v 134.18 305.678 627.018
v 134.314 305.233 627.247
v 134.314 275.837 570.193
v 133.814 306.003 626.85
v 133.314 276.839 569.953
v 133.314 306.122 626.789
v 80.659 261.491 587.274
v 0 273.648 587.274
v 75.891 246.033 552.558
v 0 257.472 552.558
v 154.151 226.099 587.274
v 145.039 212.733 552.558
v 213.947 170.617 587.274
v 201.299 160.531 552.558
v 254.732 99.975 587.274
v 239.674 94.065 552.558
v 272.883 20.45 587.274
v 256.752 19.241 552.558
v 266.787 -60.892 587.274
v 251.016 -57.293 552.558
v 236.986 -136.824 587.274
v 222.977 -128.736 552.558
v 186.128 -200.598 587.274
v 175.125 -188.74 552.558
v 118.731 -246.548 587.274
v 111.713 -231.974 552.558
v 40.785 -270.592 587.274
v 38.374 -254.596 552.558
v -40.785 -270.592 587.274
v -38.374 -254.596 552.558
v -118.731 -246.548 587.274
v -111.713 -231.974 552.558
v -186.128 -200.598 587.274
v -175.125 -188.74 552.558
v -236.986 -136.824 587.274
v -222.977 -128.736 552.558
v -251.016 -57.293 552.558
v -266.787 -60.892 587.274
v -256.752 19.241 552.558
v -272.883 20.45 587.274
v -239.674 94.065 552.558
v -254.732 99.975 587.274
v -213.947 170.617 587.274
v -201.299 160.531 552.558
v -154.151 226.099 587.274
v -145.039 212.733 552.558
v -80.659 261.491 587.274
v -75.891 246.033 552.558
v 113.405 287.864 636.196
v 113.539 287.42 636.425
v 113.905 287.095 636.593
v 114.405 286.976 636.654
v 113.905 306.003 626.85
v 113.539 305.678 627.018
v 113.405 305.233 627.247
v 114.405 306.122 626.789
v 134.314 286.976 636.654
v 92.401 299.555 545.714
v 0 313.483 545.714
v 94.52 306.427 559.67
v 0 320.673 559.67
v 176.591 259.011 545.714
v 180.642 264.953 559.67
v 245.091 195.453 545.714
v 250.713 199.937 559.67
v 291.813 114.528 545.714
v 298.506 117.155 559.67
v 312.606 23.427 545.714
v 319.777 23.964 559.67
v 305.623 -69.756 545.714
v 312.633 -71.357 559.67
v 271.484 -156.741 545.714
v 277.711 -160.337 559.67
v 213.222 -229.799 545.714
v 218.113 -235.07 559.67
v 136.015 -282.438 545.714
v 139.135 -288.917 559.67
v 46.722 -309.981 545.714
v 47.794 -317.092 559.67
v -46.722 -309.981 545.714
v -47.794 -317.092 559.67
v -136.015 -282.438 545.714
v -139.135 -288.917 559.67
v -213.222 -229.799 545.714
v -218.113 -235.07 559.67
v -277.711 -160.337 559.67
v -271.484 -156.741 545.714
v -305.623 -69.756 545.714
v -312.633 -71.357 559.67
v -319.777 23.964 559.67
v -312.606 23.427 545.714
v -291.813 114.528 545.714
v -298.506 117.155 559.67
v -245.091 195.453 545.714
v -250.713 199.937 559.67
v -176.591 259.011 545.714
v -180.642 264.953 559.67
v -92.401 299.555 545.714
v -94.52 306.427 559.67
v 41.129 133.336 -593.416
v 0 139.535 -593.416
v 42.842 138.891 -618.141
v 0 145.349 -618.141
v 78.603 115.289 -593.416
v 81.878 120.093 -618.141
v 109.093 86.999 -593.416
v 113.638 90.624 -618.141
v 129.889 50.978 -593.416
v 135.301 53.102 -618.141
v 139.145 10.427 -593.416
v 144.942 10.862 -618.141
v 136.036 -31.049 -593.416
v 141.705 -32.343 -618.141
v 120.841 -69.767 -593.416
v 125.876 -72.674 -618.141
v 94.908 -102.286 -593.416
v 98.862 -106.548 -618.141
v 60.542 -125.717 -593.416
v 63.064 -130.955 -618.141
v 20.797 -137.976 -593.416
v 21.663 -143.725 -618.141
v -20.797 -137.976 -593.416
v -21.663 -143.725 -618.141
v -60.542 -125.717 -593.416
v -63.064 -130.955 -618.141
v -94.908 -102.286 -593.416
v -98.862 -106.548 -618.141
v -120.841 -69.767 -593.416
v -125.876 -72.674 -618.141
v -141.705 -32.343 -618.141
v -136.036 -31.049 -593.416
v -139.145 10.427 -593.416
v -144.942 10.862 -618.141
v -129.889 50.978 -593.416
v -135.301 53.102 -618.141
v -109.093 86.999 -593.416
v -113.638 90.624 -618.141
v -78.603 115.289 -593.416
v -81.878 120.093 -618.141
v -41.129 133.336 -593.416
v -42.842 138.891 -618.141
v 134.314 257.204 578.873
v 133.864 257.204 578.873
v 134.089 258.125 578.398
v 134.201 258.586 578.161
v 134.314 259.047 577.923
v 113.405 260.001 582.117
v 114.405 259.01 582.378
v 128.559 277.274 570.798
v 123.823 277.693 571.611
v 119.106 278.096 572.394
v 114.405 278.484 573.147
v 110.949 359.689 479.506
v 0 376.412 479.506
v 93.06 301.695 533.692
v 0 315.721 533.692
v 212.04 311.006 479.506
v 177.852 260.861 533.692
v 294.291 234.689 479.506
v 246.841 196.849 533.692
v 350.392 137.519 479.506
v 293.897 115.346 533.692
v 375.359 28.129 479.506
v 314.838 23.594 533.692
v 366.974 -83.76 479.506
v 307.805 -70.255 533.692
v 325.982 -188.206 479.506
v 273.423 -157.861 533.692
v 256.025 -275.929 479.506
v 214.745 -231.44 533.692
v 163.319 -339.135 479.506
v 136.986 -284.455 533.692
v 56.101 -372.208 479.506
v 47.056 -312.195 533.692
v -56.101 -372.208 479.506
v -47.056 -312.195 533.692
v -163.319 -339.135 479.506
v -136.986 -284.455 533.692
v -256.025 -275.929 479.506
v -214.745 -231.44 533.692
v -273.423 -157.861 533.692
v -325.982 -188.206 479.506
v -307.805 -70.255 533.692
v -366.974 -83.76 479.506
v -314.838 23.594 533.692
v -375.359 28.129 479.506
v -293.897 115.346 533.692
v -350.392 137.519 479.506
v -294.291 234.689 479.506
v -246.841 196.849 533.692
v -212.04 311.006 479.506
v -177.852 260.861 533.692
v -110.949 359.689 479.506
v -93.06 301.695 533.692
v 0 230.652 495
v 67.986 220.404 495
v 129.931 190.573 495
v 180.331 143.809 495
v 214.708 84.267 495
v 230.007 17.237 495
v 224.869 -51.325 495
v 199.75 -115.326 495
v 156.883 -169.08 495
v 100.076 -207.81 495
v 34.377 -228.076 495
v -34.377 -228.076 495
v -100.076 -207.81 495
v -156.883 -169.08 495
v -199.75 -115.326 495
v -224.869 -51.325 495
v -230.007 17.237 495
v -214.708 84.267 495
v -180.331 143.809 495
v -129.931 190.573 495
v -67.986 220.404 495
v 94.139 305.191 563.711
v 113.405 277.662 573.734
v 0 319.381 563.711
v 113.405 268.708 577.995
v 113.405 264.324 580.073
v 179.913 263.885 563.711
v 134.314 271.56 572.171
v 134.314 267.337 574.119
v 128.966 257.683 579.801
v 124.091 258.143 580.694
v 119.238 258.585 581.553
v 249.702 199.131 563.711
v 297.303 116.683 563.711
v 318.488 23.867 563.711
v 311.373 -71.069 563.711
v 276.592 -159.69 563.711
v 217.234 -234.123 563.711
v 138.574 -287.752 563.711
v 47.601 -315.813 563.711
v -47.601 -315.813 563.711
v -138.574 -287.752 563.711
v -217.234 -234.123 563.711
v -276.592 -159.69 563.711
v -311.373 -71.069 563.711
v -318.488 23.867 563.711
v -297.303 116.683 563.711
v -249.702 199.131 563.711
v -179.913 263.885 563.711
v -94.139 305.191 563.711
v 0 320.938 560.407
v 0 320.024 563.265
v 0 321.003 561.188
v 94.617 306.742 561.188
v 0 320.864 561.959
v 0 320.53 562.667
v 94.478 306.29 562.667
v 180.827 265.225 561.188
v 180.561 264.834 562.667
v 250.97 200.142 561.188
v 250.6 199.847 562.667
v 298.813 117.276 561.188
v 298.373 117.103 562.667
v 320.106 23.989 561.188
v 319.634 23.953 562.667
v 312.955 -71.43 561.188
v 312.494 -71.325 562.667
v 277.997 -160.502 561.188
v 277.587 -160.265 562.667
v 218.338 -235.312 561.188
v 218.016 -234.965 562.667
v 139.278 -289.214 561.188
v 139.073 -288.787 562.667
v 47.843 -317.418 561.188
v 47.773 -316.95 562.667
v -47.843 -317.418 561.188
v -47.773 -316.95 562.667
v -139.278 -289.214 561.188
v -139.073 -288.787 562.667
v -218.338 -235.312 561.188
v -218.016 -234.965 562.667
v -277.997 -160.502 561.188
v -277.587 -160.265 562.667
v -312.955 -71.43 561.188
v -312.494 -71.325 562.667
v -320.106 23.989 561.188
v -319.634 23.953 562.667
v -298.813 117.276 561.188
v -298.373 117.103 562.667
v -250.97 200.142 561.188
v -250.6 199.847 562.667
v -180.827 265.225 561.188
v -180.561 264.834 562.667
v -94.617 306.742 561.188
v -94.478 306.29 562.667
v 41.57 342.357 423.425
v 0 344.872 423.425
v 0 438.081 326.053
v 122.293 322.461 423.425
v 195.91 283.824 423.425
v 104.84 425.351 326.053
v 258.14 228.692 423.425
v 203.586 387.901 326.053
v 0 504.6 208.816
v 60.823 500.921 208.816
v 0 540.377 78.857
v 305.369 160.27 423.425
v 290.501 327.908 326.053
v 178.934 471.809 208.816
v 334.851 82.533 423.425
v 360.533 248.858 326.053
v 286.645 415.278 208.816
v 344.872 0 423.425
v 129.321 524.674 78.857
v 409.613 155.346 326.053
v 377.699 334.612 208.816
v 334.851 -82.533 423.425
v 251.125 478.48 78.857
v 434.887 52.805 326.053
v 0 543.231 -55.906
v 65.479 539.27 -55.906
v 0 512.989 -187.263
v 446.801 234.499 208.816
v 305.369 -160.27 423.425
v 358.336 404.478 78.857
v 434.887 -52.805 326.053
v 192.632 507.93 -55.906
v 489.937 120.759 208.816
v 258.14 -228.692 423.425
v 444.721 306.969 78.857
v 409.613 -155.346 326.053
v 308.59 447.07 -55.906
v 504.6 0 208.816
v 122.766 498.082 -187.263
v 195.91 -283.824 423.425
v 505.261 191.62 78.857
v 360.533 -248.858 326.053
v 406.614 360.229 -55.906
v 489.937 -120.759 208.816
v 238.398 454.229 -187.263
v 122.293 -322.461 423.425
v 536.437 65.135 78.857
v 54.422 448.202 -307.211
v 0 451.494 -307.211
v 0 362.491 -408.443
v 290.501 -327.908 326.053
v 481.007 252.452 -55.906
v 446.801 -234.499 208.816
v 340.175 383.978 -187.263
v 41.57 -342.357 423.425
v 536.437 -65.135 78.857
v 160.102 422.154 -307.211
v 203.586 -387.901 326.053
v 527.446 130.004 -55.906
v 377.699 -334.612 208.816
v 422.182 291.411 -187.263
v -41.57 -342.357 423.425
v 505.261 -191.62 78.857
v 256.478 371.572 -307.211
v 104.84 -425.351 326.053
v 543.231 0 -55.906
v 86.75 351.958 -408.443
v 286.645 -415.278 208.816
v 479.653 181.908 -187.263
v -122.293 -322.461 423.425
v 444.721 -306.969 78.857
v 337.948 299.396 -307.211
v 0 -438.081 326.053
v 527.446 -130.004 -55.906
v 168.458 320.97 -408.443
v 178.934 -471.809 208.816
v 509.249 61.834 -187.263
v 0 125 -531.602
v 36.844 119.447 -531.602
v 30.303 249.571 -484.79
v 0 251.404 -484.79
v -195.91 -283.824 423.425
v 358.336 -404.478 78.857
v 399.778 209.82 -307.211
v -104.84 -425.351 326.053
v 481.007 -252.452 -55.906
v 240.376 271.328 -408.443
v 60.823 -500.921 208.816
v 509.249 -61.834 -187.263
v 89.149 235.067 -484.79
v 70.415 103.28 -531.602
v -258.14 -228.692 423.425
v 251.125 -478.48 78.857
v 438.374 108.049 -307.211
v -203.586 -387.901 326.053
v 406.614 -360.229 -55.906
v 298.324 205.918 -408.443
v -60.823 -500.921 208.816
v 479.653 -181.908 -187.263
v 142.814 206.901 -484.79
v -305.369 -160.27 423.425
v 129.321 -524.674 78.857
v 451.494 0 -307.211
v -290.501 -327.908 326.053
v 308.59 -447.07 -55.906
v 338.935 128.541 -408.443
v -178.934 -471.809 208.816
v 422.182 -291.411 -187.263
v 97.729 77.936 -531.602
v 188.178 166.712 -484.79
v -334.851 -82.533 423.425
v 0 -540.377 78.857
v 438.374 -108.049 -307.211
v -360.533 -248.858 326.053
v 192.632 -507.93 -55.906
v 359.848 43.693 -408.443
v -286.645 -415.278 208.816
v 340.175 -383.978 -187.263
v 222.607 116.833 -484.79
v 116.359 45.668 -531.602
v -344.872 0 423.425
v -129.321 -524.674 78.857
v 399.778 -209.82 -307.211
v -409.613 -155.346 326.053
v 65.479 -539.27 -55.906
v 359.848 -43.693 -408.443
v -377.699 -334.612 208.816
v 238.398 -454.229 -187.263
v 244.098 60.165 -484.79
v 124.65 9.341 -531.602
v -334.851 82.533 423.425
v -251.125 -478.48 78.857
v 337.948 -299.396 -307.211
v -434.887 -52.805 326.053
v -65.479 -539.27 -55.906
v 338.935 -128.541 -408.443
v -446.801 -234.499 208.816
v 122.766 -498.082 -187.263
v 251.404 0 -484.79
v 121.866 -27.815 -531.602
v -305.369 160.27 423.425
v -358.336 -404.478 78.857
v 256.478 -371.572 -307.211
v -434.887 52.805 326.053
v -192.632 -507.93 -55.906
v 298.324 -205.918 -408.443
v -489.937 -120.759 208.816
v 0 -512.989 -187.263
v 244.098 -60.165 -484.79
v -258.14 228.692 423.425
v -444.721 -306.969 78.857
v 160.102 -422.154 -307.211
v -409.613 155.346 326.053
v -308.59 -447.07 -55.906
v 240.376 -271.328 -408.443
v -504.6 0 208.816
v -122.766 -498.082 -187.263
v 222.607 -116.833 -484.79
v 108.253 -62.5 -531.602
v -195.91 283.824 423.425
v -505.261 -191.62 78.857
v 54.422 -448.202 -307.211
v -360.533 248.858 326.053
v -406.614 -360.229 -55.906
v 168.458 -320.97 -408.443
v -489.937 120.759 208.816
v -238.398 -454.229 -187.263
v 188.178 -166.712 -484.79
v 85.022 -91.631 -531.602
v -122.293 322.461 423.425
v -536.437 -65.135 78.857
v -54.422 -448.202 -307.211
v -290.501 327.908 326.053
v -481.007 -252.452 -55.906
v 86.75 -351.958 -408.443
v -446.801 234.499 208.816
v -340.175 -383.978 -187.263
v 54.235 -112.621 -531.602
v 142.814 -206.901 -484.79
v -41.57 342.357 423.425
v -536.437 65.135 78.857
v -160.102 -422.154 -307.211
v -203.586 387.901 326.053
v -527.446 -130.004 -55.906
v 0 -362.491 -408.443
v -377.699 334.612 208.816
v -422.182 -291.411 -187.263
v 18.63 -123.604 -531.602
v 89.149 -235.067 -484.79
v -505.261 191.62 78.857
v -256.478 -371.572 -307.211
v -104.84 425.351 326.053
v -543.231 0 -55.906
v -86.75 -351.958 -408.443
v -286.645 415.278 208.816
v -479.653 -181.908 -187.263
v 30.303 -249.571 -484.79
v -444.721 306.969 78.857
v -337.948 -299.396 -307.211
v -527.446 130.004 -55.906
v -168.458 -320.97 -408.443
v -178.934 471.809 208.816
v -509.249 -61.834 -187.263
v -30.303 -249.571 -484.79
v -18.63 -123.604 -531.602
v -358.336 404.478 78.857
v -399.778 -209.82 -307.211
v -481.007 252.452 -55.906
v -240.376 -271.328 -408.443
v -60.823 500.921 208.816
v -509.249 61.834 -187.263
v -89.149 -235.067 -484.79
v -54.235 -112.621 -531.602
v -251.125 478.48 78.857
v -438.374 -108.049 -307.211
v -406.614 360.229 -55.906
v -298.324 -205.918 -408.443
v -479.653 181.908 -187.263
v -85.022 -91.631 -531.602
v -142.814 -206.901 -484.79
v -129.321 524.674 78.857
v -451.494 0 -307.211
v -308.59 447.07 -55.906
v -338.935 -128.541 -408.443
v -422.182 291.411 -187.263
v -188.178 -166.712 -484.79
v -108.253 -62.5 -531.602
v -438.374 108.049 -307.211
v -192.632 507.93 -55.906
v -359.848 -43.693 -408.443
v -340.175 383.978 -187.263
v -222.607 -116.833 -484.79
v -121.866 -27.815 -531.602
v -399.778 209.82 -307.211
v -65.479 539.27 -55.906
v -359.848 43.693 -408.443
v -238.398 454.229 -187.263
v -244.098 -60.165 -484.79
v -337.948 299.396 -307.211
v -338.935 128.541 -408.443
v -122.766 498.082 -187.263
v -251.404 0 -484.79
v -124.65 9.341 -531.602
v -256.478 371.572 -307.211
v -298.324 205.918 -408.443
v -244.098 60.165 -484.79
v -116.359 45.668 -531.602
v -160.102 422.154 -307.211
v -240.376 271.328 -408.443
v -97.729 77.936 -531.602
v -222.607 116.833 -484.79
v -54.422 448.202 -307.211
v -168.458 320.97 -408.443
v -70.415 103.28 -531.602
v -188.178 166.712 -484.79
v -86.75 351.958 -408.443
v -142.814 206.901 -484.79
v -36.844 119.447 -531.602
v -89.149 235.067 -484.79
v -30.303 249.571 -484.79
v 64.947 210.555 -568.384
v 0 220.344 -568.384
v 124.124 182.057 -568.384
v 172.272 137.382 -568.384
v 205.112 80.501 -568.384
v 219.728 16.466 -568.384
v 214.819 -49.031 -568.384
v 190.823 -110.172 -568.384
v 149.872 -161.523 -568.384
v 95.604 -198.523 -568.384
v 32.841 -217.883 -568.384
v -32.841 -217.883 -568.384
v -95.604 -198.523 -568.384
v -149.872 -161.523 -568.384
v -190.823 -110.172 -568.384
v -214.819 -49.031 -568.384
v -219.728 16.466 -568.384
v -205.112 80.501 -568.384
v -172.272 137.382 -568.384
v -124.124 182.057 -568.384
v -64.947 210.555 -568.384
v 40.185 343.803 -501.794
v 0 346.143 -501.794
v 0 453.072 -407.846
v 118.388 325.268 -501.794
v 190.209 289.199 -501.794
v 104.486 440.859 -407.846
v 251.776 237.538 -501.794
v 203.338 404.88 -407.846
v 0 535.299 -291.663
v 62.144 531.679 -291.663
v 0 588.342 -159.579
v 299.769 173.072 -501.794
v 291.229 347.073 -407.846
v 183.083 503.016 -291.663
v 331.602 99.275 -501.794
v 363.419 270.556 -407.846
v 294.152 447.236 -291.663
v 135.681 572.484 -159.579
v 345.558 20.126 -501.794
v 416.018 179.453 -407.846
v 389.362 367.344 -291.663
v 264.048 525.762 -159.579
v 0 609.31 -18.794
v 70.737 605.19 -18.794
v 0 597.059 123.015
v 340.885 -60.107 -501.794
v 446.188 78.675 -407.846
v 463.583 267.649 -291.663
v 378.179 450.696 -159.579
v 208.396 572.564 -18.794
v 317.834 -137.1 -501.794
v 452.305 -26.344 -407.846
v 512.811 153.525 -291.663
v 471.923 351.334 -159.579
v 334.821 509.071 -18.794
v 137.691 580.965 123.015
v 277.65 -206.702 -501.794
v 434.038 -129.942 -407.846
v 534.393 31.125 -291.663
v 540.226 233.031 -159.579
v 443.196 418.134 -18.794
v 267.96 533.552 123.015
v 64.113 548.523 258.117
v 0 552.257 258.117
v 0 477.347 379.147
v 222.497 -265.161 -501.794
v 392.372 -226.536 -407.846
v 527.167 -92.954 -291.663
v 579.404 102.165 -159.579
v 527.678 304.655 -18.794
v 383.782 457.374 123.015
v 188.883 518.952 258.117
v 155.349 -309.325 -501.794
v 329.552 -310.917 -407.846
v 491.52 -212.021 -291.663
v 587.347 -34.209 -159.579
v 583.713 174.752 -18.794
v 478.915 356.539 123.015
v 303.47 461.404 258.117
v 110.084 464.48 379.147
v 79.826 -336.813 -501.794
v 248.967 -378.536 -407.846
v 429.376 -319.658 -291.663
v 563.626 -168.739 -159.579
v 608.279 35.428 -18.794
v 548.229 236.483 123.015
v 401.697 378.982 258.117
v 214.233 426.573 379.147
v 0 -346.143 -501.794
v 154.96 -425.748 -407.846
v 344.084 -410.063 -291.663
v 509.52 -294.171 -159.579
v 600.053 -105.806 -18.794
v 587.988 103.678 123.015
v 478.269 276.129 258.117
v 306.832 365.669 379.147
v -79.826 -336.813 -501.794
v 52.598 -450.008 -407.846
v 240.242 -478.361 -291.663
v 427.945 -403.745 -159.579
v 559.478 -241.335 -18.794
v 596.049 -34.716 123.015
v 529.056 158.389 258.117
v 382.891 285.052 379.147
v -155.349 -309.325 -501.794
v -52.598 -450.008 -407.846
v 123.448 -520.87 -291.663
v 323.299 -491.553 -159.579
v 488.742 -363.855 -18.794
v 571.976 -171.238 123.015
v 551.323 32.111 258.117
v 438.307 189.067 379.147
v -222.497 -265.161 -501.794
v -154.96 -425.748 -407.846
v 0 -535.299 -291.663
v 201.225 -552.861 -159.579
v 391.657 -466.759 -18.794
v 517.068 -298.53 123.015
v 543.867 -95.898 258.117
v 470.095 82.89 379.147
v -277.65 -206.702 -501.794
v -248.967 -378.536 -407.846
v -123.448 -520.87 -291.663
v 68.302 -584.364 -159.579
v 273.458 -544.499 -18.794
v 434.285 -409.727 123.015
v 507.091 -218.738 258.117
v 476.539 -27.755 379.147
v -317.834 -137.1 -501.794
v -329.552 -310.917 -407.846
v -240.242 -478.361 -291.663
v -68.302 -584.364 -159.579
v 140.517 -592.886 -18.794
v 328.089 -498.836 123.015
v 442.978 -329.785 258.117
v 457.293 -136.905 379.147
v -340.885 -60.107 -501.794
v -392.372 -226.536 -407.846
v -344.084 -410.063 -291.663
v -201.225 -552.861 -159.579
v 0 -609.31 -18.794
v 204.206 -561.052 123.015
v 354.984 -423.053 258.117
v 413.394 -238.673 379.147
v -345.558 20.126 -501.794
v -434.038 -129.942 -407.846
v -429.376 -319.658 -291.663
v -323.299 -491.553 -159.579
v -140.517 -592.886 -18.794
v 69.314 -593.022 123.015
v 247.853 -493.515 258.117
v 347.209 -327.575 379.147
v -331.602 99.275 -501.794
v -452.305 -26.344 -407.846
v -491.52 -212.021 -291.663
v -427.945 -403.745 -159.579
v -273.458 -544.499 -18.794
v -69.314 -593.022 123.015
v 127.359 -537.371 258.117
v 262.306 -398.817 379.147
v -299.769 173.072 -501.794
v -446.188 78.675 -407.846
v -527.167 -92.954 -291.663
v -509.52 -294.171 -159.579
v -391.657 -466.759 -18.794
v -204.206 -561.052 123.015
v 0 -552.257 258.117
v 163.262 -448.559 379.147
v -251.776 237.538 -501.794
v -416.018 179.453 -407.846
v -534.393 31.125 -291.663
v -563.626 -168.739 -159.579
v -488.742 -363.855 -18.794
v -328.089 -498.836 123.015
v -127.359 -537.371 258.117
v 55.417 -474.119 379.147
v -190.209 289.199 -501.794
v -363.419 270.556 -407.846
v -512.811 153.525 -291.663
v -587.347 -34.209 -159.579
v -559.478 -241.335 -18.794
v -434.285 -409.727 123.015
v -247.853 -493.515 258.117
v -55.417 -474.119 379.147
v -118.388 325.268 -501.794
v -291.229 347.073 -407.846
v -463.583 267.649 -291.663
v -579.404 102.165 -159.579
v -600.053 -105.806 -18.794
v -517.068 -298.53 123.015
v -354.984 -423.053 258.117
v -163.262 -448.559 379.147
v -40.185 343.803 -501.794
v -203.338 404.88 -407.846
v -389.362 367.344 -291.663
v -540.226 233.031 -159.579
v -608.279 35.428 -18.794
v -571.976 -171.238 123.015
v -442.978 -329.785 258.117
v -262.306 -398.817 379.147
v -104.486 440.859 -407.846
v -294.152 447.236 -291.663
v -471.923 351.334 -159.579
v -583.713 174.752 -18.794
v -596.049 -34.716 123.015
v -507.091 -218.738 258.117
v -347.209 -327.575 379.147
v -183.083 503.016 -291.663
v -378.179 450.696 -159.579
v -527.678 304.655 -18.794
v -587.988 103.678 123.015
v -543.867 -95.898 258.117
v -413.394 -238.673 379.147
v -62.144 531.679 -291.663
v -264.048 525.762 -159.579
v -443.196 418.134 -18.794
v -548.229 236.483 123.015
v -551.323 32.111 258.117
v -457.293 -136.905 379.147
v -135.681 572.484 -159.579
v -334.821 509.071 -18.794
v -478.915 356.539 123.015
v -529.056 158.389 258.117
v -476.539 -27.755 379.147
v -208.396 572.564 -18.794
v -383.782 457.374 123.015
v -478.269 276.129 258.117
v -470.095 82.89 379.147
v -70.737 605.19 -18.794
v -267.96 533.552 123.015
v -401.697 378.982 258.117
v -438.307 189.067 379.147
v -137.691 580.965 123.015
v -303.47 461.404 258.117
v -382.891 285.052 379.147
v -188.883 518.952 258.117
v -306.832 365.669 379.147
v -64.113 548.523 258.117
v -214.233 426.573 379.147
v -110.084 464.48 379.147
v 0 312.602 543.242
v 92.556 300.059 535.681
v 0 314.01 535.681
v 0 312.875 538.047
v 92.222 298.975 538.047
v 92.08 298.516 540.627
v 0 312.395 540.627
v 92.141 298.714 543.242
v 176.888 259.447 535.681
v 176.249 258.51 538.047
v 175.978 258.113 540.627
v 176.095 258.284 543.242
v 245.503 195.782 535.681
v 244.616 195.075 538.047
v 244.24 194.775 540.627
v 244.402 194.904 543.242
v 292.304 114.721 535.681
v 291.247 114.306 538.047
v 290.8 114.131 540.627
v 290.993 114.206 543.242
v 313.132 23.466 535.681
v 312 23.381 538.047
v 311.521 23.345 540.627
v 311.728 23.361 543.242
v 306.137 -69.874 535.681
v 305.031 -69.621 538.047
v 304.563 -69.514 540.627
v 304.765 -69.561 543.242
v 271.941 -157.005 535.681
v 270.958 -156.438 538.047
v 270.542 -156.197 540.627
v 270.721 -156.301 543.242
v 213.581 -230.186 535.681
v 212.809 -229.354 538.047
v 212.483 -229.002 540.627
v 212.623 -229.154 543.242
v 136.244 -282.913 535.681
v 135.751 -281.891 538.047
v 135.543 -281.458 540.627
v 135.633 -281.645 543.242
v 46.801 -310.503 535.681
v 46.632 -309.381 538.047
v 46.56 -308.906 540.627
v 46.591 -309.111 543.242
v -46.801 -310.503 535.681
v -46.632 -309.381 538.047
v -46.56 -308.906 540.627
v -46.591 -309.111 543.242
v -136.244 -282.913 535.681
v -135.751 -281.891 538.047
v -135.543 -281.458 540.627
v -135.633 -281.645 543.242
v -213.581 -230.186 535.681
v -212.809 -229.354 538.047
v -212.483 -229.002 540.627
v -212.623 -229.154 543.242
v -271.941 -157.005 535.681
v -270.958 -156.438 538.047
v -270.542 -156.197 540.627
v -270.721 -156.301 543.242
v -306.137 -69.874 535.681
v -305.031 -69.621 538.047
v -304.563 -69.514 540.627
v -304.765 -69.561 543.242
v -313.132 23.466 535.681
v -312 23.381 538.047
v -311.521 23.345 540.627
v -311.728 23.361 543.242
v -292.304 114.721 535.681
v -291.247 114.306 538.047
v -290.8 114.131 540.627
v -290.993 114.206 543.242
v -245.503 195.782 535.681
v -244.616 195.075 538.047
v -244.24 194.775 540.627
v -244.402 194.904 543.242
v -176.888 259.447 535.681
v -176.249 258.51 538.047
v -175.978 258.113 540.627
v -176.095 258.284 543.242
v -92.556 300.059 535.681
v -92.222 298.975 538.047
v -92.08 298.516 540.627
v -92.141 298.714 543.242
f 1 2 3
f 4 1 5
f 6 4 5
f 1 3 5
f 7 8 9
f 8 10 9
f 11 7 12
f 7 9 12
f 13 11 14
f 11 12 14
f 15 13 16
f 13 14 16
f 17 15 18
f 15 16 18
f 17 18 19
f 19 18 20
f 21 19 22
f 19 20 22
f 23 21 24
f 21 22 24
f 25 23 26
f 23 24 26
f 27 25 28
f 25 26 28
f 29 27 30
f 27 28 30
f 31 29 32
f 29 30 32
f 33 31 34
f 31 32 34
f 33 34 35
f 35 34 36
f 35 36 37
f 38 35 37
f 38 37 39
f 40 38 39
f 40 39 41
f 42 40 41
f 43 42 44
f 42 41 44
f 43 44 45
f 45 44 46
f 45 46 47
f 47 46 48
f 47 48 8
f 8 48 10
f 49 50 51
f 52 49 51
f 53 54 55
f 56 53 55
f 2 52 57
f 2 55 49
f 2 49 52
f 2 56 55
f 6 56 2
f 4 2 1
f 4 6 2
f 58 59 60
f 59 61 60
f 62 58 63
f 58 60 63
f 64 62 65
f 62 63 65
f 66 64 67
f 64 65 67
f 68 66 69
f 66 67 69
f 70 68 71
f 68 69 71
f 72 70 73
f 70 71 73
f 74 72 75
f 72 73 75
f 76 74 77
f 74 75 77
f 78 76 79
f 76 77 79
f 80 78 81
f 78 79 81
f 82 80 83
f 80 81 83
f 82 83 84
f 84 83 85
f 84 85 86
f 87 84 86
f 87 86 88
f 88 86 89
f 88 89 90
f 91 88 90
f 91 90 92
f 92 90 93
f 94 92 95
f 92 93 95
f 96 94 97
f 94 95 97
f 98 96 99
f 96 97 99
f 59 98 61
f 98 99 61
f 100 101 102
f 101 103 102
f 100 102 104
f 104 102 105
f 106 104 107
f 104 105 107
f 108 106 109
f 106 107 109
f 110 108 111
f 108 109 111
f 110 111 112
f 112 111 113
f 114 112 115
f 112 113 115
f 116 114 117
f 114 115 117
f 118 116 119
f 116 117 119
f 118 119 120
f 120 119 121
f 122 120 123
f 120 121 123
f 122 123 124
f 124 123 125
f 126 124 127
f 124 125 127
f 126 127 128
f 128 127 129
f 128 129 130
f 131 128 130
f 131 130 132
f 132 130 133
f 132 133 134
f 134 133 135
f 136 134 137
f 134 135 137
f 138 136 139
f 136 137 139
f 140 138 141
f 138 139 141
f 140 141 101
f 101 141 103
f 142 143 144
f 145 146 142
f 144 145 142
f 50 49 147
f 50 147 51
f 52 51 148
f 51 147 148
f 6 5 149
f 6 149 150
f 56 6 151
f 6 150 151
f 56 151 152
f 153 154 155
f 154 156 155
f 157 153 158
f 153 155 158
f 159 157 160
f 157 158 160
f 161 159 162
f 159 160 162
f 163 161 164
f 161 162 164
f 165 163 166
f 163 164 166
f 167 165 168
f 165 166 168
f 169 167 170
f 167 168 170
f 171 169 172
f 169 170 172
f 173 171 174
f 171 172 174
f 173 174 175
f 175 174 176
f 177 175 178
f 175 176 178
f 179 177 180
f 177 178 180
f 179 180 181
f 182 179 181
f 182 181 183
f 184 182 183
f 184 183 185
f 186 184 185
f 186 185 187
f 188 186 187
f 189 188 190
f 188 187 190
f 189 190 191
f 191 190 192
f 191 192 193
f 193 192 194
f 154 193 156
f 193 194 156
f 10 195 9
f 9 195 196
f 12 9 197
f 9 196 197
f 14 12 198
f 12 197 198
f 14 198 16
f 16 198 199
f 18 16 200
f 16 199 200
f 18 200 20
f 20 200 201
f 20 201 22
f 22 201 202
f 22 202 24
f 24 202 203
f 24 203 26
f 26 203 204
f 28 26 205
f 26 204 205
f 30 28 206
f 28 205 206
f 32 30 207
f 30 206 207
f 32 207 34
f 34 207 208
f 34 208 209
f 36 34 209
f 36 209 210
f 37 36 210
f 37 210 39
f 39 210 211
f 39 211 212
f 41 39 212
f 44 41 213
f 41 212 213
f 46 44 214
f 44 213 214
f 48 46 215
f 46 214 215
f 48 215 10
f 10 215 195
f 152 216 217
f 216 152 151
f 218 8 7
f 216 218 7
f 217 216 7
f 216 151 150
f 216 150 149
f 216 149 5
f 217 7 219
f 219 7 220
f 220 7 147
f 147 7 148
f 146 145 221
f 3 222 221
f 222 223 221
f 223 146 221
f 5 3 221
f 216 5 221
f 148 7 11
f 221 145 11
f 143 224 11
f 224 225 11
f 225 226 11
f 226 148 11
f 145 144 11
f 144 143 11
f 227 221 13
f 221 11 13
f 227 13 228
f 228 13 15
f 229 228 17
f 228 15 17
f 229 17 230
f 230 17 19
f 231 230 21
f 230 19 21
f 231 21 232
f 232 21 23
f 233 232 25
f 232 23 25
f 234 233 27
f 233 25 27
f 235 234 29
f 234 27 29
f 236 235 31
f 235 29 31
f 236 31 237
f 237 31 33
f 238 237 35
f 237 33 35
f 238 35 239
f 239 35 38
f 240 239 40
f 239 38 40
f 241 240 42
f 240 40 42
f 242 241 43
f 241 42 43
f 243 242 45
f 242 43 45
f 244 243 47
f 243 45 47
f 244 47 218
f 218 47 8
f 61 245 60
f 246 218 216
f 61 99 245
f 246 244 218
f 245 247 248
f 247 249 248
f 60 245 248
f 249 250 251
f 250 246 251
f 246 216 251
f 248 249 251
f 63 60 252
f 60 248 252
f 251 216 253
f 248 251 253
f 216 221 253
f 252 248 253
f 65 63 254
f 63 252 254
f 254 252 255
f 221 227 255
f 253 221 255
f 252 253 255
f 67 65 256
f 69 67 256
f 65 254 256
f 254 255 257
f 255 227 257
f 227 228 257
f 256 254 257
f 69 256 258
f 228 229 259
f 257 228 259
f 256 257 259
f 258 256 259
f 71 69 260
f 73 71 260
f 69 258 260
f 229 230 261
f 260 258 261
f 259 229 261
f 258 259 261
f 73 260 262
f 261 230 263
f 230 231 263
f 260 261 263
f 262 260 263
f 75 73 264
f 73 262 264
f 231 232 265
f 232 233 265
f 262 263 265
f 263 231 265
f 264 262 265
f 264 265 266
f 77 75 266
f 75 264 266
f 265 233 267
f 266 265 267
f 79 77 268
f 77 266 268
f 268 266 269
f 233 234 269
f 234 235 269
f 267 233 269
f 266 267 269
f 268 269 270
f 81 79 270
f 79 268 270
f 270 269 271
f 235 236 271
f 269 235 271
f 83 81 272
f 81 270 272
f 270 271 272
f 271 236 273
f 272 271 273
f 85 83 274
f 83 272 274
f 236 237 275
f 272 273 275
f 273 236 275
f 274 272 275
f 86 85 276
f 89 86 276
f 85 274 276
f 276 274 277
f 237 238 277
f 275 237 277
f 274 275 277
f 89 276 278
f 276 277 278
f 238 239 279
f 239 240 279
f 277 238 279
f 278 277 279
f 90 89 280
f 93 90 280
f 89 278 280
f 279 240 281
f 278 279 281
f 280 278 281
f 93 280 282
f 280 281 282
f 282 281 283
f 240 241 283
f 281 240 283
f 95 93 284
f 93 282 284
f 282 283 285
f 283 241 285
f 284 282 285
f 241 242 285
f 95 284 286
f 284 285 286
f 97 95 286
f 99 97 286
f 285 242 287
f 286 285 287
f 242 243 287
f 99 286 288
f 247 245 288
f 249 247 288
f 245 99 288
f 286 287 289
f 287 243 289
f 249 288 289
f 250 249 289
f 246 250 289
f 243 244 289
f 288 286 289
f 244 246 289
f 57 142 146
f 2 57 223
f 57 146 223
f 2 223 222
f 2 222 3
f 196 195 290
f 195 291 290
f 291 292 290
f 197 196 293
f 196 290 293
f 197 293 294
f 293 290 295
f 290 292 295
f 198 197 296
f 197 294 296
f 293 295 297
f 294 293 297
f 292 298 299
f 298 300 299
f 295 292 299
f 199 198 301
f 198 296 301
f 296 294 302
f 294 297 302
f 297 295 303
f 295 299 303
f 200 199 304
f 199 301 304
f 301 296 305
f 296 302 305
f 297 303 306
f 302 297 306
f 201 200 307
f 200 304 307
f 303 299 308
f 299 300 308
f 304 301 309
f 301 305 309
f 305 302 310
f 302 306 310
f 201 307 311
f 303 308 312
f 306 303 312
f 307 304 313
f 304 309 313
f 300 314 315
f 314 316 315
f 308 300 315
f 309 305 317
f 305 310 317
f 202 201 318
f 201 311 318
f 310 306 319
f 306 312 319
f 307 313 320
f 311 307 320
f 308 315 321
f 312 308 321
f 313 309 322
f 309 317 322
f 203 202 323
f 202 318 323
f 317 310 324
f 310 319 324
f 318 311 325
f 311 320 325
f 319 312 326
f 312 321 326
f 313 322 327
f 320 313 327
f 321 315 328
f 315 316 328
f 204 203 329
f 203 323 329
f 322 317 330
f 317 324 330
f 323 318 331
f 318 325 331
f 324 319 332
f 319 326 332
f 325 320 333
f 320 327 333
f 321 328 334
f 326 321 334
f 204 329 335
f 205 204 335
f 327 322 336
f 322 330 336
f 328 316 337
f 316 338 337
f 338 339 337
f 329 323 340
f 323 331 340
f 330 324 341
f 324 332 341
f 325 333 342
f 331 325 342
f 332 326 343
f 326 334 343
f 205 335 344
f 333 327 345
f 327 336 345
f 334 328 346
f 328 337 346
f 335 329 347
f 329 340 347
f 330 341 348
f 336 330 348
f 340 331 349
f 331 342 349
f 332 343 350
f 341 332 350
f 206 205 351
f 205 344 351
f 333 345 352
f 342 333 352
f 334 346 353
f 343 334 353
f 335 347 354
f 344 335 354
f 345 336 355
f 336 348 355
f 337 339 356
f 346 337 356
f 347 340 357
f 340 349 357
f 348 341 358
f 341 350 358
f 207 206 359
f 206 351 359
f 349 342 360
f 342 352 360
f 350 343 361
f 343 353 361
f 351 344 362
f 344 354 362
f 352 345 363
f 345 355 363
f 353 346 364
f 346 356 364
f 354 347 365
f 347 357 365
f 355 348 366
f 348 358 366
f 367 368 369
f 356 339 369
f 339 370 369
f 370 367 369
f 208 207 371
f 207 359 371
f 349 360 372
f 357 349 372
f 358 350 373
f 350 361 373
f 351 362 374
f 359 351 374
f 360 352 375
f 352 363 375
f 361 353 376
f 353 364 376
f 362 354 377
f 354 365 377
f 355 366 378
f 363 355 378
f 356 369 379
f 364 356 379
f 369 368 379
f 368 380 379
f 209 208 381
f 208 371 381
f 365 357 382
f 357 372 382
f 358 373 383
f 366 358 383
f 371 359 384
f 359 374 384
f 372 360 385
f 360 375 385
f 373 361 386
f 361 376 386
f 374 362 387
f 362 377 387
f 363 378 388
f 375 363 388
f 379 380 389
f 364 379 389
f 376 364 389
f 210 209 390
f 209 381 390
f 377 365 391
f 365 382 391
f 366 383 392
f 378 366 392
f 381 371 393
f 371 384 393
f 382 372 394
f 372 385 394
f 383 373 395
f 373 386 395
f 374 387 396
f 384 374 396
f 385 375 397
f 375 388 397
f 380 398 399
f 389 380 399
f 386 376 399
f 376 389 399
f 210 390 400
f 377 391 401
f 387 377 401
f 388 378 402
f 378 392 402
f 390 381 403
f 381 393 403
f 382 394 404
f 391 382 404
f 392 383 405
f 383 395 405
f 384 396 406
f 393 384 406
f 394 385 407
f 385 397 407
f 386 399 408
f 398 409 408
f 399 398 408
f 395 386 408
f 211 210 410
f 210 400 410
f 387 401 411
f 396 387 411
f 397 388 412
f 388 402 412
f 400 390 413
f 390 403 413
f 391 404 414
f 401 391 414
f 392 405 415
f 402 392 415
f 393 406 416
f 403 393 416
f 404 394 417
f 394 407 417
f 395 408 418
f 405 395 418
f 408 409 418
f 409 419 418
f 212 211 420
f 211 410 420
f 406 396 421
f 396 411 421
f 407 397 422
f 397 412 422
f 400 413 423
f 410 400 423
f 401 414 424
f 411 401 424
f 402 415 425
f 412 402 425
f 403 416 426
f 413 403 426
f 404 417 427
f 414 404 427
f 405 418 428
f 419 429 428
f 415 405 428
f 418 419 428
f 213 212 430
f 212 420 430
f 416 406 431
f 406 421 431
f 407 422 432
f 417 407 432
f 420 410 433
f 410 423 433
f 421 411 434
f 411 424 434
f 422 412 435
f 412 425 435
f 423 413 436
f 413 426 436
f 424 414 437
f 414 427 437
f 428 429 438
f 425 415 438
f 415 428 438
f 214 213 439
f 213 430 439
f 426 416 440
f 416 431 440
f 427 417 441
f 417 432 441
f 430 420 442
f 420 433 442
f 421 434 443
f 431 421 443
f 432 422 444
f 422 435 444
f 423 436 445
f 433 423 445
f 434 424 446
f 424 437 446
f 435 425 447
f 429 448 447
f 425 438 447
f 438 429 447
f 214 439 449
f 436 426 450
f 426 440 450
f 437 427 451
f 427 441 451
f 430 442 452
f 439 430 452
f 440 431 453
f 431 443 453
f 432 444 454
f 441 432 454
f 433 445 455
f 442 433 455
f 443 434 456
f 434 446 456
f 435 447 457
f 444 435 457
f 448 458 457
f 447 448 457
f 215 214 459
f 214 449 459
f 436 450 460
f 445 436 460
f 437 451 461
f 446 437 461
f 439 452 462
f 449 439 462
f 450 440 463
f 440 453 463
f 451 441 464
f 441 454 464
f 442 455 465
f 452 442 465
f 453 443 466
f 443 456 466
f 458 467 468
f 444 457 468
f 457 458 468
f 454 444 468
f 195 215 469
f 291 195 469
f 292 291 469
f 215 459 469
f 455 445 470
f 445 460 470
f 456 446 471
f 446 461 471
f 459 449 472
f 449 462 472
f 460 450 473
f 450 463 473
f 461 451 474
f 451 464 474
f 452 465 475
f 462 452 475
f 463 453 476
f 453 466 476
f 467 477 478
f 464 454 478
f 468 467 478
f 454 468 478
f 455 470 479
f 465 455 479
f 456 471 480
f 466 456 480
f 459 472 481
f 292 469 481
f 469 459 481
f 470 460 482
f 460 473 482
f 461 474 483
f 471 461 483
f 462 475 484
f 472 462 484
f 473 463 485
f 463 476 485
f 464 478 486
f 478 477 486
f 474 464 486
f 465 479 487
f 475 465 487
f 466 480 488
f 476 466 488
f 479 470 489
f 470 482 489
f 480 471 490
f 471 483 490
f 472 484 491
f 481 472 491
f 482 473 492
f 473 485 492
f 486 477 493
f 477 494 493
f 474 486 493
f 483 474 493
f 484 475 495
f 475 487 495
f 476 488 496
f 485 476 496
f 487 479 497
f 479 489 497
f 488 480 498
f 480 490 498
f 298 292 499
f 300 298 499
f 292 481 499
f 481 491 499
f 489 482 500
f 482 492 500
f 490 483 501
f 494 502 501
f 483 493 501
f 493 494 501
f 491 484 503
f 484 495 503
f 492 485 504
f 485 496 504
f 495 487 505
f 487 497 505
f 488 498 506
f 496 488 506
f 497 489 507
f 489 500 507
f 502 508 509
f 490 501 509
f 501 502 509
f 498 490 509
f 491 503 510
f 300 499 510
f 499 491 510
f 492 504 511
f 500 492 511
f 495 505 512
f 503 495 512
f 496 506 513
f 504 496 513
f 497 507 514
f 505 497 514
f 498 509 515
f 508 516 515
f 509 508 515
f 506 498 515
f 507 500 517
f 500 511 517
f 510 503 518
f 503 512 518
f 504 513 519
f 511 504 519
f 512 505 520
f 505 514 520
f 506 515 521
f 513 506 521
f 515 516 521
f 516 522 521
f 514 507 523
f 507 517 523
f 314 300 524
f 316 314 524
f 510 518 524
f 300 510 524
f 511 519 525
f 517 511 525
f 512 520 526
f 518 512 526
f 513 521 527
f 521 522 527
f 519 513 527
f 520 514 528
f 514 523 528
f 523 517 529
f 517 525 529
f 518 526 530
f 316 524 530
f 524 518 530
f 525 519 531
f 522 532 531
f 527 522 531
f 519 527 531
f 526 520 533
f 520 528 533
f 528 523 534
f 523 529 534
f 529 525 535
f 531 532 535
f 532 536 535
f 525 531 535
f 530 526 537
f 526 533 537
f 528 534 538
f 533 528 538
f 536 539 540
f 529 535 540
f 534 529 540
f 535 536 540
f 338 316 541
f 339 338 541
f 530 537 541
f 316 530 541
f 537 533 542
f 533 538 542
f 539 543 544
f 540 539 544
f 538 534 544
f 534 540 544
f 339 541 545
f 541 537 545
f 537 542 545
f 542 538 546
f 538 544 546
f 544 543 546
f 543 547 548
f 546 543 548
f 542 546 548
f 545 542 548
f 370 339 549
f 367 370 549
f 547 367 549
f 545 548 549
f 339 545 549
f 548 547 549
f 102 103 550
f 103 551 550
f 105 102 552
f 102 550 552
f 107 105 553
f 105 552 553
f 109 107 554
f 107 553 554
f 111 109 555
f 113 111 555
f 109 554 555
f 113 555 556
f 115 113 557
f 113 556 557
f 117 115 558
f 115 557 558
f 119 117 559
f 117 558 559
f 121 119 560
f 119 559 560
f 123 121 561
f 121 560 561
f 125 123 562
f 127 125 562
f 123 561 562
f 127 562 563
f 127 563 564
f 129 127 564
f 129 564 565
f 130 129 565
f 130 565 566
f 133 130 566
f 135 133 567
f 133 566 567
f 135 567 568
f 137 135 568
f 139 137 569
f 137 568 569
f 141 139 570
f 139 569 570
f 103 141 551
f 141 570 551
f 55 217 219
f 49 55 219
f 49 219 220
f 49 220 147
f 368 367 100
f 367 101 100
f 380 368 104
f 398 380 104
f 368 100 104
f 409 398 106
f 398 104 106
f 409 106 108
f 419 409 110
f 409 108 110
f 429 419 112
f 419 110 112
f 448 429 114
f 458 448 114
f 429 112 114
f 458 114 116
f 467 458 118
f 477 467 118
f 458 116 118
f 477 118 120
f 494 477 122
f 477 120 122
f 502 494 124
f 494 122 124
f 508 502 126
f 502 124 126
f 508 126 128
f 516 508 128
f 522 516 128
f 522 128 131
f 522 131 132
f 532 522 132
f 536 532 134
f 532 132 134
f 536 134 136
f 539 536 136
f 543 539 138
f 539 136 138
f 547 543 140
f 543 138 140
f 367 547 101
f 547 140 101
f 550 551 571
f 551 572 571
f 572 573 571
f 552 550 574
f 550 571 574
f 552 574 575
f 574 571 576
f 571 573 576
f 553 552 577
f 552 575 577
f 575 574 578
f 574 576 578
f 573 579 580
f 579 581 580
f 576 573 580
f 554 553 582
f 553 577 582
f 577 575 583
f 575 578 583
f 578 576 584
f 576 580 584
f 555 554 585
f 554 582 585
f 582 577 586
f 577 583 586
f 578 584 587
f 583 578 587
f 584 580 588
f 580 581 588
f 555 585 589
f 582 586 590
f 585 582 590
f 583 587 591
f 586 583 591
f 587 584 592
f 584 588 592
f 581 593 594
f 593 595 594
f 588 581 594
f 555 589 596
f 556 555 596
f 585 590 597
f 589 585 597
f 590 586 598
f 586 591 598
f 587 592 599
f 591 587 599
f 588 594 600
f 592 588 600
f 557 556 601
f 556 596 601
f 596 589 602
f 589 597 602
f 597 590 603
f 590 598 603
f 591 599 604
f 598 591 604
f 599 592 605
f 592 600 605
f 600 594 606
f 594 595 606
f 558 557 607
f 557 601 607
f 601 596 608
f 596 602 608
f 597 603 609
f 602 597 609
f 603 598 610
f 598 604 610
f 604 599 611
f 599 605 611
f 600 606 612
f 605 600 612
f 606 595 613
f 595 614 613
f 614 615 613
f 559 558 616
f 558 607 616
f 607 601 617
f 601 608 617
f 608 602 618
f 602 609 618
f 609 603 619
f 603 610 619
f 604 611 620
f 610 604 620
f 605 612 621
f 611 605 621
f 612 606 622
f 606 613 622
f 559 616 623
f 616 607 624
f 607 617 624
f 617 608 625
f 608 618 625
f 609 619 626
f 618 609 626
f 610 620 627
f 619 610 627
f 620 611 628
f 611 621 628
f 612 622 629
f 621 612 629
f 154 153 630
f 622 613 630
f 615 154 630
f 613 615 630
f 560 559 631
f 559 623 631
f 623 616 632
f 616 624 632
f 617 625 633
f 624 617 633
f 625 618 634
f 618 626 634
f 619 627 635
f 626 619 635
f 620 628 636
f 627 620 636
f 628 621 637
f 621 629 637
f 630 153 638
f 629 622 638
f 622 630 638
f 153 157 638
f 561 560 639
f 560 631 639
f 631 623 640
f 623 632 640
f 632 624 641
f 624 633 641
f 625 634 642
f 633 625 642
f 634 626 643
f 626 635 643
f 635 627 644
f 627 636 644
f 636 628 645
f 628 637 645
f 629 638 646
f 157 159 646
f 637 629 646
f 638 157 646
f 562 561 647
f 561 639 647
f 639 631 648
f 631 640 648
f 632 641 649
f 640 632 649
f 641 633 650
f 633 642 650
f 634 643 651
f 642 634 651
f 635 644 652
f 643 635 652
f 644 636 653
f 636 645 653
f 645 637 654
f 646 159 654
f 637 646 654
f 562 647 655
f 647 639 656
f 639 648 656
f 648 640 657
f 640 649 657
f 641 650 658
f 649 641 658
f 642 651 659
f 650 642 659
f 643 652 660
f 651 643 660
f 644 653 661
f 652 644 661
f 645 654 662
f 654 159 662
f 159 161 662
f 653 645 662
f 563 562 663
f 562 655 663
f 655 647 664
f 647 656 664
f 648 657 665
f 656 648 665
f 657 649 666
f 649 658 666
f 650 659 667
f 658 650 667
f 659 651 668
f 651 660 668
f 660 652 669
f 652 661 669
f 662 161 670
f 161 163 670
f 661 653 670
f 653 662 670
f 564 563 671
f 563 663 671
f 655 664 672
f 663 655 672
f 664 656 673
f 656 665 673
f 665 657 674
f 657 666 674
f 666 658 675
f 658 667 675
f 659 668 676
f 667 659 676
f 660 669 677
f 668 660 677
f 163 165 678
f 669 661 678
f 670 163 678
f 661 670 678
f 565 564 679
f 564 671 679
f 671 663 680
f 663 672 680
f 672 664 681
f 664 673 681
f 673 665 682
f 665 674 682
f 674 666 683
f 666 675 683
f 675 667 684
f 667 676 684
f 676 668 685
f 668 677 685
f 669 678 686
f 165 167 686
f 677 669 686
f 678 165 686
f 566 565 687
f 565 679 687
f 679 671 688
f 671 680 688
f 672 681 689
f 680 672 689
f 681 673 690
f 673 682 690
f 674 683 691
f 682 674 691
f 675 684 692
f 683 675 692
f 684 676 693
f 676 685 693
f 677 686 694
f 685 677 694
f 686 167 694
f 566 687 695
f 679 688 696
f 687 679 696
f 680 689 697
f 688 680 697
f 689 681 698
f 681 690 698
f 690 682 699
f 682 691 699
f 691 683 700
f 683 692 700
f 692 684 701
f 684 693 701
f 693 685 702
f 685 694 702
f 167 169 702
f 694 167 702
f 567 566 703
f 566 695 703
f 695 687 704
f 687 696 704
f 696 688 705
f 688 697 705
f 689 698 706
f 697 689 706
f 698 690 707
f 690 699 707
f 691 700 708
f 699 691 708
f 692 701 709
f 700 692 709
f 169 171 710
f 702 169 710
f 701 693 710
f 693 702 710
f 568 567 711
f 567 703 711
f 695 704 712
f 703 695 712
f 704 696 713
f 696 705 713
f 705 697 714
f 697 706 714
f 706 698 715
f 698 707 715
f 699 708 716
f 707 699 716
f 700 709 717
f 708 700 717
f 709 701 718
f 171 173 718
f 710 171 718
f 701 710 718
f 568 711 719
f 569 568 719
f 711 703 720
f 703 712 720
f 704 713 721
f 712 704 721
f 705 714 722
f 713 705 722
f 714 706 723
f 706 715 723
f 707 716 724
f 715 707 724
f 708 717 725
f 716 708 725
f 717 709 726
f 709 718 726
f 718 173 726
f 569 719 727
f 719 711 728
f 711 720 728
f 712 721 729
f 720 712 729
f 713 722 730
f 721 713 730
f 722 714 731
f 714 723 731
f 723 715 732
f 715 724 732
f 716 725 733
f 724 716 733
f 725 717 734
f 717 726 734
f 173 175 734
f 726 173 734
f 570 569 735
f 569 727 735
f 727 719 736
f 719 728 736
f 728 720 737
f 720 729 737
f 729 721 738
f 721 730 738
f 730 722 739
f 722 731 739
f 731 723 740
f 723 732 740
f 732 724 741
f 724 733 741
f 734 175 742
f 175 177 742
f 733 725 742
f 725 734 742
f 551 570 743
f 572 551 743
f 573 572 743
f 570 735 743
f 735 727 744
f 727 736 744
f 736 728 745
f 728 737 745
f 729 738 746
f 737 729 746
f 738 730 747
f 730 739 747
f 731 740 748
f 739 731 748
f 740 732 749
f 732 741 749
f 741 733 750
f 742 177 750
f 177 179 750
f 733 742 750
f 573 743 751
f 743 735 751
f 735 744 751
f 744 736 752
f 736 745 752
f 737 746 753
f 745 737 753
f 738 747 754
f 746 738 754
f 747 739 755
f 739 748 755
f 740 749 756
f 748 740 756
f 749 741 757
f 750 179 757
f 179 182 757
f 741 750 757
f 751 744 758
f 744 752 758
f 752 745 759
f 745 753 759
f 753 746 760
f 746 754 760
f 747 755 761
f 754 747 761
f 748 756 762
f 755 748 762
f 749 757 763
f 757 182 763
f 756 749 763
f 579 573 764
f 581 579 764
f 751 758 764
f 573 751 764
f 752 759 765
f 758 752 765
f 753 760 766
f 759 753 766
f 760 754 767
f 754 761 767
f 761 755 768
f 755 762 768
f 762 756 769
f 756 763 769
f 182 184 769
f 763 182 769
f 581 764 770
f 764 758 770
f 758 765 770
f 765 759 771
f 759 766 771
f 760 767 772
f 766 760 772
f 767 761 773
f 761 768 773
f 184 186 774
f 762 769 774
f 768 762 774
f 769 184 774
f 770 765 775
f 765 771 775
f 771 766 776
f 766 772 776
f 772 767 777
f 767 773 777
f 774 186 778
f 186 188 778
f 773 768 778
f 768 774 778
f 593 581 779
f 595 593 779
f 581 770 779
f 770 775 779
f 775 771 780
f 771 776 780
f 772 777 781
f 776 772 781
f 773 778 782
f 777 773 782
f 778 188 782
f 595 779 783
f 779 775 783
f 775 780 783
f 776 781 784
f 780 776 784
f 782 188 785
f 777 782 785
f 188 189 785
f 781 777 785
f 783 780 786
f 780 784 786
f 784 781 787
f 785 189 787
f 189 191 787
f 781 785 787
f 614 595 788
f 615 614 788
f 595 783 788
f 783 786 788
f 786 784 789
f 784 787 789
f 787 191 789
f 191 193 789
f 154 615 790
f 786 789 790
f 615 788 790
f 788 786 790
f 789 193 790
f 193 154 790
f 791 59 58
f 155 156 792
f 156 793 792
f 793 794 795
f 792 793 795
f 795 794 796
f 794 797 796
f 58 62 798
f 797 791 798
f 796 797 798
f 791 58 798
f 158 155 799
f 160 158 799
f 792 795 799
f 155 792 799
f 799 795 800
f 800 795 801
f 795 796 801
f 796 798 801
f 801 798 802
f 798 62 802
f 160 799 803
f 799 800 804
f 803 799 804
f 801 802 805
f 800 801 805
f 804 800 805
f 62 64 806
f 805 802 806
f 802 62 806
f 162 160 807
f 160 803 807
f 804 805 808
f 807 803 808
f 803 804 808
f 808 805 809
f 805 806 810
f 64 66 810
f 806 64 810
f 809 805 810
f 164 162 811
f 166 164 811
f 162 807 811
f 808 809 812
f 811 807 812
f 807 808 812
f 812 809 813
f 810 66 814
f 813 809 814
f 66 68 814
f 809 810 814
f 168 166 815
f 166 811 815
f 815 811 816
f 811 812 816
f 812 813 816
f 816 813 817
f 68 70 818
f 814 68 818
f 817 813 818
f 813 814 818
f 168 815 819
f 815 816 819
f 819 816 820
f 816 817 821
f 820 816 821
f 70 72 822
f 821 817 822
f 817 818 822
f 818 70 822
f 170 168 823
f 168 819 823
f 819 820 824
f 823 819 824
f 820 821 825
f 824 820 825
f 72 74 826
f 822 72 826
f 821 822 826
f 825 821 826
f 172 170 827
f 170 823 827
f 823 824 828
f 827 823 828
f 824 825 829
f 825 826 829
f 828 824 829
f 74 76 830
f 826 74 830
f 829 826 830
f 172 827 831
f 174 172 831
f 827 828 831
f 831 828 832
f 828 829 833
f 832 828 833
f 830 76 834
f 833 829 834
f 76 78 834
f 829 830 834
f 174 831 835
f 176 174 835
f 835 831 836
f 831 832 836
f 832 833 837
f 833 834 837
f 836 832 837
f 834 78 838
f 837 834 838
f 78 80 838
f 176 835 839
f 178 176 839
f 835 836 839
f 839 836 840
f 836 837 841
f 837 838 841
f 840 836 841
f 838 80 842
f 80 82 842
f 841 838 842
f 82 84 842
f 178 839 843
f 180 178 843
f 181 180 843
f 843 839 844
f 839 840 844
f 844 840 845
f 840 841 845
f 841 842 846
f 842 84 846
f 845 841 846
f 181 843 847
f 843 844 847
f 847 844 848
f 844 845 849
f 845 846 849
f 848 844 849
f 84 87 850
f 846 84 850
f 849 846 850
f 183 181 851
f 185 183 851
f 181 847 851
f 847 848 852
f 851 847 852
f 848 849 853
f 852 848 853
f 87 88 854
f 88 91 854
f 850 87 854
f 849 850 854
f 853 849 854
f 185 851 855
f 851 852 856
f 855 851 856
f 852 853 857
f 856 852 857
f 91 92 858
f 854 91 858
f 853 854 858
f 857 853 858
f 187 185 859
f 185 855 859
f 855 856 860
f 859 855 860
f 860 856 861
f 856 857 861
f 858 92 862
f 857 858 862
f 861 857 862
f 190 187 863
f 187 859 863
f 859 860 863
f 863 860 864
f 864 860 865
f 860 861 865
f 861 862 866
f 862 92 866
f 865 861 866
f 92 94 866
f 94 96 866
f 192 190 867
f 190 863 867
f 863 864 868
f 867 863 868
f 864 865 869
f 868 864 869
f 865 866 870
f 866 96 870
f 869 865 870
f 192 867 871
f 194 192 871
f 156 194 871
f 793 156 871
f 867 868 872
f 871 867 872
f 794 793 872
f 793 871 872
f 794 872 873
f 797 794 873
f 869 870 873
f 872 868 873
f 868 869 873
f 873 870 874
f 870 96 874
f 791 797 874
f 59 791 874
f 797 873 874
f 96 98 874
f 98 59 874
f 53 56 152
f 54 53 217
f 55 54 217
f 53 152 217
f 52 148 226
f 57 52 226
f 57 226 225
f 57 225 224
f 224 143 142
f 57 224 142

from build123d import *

# Parameters (mm, degrees)
BOSS_EXTRUDE3_DEPTH      = 50
BOSS_EXTRUDE3_DEPTH_BACK = 15


with BuildPart() as part:
    # Sphere Sketch → Sphere (revolve)
    with BuildSketch(Plane(origin=(0, 0, 0), x_dir=(0, 0, -1), z_dir=(1, 0, 0))):
        with BuildLine():
            Line((-587.274308735, 273.648124971), (-552.558139535, 257.471673071))
            Line((-552.558139535, 257.471673071), (-495, 230.651707126))
            ThreePointArc((-495, 230.651707126), (55.906074852, 543.230817236), (531.601551916, 125))
            Line((531.601551916, 125), (593.41568586, 139.534883721))
            Line((593.41568586, 139.534883721), (618.141339438, 145.348837209))
            Line((618.141339438, 145.348837209), (568.384355354, 220.343787272))
            ThreePointArc((568.384355354, 220.343787272), (89.800502747, 602.949442082), (-479.506339183, 376.411783401))
            Line((-479.506339183, 376.411783401), (-533.692189105, 315.721145663))
            ThreePointArc((-533.692189105, 315.721145663), (-539.321048901, 312.550143885), (-545.714010445, 313.482537358))
            Line((-545.714010445, 313.482537358), (-559.670433417, 320.673382776))
            ThreePointArc((-559.670433417, 320.673382776), (-561.95861772, 320.863883523), (-563.711312727, 319.380597256))
            Line((-563.711312727, 319.380597256), (-587.274308735, 273.648124971))
        make_face()
    revolve(axis=Axis((0, 0, 0), (0, 0, -1)))

    # Sketch1 → Boss-Extrude3 (add, two sides: drawn at the far end of the back side and taken through both)
    with BuildSketch(Plane(origin=(0, 296.514361113, 575.492810731), x_dir=(1, 0, 0), z_dir=(0, 0.45801563170636533, 0.8889441383532597)).offset(-BOSS_EXTRUDE3_DEPTH_BACK)):
        with BuildLine():
            Line((114.40522717, -36.492315976), (134.313589091, -36.492315976))
            Line((134.313589091, -36.492315976), (134.313589091, -15.953517695))
            ThreePointArc((134.313589091, -15.953517695), (134.020695872, -15.246410914), (133.313589091, -14.953517695))
            Line((133.313589091, -14.953517695), (114.40522717, -14.953517695))
            ThreePointArc((114.40522717, -14.953517695), (113.698120389, -15.246410914), (113.40522717, -15.953517695))
            Line((113.40522717, -15.953517695), (113.40522717, -35.492315976))
            ThreePointArc((113.40522717, -35.492315976), (113.698120389, -36.199422758), (114.40522717, -36.492315976))
        make_face()
    extrude(amount=BOSS_EXTRUDE3_DEPTH + BOSS_EXTRUDE3_DEPTH_BACK)


solid = part.part
